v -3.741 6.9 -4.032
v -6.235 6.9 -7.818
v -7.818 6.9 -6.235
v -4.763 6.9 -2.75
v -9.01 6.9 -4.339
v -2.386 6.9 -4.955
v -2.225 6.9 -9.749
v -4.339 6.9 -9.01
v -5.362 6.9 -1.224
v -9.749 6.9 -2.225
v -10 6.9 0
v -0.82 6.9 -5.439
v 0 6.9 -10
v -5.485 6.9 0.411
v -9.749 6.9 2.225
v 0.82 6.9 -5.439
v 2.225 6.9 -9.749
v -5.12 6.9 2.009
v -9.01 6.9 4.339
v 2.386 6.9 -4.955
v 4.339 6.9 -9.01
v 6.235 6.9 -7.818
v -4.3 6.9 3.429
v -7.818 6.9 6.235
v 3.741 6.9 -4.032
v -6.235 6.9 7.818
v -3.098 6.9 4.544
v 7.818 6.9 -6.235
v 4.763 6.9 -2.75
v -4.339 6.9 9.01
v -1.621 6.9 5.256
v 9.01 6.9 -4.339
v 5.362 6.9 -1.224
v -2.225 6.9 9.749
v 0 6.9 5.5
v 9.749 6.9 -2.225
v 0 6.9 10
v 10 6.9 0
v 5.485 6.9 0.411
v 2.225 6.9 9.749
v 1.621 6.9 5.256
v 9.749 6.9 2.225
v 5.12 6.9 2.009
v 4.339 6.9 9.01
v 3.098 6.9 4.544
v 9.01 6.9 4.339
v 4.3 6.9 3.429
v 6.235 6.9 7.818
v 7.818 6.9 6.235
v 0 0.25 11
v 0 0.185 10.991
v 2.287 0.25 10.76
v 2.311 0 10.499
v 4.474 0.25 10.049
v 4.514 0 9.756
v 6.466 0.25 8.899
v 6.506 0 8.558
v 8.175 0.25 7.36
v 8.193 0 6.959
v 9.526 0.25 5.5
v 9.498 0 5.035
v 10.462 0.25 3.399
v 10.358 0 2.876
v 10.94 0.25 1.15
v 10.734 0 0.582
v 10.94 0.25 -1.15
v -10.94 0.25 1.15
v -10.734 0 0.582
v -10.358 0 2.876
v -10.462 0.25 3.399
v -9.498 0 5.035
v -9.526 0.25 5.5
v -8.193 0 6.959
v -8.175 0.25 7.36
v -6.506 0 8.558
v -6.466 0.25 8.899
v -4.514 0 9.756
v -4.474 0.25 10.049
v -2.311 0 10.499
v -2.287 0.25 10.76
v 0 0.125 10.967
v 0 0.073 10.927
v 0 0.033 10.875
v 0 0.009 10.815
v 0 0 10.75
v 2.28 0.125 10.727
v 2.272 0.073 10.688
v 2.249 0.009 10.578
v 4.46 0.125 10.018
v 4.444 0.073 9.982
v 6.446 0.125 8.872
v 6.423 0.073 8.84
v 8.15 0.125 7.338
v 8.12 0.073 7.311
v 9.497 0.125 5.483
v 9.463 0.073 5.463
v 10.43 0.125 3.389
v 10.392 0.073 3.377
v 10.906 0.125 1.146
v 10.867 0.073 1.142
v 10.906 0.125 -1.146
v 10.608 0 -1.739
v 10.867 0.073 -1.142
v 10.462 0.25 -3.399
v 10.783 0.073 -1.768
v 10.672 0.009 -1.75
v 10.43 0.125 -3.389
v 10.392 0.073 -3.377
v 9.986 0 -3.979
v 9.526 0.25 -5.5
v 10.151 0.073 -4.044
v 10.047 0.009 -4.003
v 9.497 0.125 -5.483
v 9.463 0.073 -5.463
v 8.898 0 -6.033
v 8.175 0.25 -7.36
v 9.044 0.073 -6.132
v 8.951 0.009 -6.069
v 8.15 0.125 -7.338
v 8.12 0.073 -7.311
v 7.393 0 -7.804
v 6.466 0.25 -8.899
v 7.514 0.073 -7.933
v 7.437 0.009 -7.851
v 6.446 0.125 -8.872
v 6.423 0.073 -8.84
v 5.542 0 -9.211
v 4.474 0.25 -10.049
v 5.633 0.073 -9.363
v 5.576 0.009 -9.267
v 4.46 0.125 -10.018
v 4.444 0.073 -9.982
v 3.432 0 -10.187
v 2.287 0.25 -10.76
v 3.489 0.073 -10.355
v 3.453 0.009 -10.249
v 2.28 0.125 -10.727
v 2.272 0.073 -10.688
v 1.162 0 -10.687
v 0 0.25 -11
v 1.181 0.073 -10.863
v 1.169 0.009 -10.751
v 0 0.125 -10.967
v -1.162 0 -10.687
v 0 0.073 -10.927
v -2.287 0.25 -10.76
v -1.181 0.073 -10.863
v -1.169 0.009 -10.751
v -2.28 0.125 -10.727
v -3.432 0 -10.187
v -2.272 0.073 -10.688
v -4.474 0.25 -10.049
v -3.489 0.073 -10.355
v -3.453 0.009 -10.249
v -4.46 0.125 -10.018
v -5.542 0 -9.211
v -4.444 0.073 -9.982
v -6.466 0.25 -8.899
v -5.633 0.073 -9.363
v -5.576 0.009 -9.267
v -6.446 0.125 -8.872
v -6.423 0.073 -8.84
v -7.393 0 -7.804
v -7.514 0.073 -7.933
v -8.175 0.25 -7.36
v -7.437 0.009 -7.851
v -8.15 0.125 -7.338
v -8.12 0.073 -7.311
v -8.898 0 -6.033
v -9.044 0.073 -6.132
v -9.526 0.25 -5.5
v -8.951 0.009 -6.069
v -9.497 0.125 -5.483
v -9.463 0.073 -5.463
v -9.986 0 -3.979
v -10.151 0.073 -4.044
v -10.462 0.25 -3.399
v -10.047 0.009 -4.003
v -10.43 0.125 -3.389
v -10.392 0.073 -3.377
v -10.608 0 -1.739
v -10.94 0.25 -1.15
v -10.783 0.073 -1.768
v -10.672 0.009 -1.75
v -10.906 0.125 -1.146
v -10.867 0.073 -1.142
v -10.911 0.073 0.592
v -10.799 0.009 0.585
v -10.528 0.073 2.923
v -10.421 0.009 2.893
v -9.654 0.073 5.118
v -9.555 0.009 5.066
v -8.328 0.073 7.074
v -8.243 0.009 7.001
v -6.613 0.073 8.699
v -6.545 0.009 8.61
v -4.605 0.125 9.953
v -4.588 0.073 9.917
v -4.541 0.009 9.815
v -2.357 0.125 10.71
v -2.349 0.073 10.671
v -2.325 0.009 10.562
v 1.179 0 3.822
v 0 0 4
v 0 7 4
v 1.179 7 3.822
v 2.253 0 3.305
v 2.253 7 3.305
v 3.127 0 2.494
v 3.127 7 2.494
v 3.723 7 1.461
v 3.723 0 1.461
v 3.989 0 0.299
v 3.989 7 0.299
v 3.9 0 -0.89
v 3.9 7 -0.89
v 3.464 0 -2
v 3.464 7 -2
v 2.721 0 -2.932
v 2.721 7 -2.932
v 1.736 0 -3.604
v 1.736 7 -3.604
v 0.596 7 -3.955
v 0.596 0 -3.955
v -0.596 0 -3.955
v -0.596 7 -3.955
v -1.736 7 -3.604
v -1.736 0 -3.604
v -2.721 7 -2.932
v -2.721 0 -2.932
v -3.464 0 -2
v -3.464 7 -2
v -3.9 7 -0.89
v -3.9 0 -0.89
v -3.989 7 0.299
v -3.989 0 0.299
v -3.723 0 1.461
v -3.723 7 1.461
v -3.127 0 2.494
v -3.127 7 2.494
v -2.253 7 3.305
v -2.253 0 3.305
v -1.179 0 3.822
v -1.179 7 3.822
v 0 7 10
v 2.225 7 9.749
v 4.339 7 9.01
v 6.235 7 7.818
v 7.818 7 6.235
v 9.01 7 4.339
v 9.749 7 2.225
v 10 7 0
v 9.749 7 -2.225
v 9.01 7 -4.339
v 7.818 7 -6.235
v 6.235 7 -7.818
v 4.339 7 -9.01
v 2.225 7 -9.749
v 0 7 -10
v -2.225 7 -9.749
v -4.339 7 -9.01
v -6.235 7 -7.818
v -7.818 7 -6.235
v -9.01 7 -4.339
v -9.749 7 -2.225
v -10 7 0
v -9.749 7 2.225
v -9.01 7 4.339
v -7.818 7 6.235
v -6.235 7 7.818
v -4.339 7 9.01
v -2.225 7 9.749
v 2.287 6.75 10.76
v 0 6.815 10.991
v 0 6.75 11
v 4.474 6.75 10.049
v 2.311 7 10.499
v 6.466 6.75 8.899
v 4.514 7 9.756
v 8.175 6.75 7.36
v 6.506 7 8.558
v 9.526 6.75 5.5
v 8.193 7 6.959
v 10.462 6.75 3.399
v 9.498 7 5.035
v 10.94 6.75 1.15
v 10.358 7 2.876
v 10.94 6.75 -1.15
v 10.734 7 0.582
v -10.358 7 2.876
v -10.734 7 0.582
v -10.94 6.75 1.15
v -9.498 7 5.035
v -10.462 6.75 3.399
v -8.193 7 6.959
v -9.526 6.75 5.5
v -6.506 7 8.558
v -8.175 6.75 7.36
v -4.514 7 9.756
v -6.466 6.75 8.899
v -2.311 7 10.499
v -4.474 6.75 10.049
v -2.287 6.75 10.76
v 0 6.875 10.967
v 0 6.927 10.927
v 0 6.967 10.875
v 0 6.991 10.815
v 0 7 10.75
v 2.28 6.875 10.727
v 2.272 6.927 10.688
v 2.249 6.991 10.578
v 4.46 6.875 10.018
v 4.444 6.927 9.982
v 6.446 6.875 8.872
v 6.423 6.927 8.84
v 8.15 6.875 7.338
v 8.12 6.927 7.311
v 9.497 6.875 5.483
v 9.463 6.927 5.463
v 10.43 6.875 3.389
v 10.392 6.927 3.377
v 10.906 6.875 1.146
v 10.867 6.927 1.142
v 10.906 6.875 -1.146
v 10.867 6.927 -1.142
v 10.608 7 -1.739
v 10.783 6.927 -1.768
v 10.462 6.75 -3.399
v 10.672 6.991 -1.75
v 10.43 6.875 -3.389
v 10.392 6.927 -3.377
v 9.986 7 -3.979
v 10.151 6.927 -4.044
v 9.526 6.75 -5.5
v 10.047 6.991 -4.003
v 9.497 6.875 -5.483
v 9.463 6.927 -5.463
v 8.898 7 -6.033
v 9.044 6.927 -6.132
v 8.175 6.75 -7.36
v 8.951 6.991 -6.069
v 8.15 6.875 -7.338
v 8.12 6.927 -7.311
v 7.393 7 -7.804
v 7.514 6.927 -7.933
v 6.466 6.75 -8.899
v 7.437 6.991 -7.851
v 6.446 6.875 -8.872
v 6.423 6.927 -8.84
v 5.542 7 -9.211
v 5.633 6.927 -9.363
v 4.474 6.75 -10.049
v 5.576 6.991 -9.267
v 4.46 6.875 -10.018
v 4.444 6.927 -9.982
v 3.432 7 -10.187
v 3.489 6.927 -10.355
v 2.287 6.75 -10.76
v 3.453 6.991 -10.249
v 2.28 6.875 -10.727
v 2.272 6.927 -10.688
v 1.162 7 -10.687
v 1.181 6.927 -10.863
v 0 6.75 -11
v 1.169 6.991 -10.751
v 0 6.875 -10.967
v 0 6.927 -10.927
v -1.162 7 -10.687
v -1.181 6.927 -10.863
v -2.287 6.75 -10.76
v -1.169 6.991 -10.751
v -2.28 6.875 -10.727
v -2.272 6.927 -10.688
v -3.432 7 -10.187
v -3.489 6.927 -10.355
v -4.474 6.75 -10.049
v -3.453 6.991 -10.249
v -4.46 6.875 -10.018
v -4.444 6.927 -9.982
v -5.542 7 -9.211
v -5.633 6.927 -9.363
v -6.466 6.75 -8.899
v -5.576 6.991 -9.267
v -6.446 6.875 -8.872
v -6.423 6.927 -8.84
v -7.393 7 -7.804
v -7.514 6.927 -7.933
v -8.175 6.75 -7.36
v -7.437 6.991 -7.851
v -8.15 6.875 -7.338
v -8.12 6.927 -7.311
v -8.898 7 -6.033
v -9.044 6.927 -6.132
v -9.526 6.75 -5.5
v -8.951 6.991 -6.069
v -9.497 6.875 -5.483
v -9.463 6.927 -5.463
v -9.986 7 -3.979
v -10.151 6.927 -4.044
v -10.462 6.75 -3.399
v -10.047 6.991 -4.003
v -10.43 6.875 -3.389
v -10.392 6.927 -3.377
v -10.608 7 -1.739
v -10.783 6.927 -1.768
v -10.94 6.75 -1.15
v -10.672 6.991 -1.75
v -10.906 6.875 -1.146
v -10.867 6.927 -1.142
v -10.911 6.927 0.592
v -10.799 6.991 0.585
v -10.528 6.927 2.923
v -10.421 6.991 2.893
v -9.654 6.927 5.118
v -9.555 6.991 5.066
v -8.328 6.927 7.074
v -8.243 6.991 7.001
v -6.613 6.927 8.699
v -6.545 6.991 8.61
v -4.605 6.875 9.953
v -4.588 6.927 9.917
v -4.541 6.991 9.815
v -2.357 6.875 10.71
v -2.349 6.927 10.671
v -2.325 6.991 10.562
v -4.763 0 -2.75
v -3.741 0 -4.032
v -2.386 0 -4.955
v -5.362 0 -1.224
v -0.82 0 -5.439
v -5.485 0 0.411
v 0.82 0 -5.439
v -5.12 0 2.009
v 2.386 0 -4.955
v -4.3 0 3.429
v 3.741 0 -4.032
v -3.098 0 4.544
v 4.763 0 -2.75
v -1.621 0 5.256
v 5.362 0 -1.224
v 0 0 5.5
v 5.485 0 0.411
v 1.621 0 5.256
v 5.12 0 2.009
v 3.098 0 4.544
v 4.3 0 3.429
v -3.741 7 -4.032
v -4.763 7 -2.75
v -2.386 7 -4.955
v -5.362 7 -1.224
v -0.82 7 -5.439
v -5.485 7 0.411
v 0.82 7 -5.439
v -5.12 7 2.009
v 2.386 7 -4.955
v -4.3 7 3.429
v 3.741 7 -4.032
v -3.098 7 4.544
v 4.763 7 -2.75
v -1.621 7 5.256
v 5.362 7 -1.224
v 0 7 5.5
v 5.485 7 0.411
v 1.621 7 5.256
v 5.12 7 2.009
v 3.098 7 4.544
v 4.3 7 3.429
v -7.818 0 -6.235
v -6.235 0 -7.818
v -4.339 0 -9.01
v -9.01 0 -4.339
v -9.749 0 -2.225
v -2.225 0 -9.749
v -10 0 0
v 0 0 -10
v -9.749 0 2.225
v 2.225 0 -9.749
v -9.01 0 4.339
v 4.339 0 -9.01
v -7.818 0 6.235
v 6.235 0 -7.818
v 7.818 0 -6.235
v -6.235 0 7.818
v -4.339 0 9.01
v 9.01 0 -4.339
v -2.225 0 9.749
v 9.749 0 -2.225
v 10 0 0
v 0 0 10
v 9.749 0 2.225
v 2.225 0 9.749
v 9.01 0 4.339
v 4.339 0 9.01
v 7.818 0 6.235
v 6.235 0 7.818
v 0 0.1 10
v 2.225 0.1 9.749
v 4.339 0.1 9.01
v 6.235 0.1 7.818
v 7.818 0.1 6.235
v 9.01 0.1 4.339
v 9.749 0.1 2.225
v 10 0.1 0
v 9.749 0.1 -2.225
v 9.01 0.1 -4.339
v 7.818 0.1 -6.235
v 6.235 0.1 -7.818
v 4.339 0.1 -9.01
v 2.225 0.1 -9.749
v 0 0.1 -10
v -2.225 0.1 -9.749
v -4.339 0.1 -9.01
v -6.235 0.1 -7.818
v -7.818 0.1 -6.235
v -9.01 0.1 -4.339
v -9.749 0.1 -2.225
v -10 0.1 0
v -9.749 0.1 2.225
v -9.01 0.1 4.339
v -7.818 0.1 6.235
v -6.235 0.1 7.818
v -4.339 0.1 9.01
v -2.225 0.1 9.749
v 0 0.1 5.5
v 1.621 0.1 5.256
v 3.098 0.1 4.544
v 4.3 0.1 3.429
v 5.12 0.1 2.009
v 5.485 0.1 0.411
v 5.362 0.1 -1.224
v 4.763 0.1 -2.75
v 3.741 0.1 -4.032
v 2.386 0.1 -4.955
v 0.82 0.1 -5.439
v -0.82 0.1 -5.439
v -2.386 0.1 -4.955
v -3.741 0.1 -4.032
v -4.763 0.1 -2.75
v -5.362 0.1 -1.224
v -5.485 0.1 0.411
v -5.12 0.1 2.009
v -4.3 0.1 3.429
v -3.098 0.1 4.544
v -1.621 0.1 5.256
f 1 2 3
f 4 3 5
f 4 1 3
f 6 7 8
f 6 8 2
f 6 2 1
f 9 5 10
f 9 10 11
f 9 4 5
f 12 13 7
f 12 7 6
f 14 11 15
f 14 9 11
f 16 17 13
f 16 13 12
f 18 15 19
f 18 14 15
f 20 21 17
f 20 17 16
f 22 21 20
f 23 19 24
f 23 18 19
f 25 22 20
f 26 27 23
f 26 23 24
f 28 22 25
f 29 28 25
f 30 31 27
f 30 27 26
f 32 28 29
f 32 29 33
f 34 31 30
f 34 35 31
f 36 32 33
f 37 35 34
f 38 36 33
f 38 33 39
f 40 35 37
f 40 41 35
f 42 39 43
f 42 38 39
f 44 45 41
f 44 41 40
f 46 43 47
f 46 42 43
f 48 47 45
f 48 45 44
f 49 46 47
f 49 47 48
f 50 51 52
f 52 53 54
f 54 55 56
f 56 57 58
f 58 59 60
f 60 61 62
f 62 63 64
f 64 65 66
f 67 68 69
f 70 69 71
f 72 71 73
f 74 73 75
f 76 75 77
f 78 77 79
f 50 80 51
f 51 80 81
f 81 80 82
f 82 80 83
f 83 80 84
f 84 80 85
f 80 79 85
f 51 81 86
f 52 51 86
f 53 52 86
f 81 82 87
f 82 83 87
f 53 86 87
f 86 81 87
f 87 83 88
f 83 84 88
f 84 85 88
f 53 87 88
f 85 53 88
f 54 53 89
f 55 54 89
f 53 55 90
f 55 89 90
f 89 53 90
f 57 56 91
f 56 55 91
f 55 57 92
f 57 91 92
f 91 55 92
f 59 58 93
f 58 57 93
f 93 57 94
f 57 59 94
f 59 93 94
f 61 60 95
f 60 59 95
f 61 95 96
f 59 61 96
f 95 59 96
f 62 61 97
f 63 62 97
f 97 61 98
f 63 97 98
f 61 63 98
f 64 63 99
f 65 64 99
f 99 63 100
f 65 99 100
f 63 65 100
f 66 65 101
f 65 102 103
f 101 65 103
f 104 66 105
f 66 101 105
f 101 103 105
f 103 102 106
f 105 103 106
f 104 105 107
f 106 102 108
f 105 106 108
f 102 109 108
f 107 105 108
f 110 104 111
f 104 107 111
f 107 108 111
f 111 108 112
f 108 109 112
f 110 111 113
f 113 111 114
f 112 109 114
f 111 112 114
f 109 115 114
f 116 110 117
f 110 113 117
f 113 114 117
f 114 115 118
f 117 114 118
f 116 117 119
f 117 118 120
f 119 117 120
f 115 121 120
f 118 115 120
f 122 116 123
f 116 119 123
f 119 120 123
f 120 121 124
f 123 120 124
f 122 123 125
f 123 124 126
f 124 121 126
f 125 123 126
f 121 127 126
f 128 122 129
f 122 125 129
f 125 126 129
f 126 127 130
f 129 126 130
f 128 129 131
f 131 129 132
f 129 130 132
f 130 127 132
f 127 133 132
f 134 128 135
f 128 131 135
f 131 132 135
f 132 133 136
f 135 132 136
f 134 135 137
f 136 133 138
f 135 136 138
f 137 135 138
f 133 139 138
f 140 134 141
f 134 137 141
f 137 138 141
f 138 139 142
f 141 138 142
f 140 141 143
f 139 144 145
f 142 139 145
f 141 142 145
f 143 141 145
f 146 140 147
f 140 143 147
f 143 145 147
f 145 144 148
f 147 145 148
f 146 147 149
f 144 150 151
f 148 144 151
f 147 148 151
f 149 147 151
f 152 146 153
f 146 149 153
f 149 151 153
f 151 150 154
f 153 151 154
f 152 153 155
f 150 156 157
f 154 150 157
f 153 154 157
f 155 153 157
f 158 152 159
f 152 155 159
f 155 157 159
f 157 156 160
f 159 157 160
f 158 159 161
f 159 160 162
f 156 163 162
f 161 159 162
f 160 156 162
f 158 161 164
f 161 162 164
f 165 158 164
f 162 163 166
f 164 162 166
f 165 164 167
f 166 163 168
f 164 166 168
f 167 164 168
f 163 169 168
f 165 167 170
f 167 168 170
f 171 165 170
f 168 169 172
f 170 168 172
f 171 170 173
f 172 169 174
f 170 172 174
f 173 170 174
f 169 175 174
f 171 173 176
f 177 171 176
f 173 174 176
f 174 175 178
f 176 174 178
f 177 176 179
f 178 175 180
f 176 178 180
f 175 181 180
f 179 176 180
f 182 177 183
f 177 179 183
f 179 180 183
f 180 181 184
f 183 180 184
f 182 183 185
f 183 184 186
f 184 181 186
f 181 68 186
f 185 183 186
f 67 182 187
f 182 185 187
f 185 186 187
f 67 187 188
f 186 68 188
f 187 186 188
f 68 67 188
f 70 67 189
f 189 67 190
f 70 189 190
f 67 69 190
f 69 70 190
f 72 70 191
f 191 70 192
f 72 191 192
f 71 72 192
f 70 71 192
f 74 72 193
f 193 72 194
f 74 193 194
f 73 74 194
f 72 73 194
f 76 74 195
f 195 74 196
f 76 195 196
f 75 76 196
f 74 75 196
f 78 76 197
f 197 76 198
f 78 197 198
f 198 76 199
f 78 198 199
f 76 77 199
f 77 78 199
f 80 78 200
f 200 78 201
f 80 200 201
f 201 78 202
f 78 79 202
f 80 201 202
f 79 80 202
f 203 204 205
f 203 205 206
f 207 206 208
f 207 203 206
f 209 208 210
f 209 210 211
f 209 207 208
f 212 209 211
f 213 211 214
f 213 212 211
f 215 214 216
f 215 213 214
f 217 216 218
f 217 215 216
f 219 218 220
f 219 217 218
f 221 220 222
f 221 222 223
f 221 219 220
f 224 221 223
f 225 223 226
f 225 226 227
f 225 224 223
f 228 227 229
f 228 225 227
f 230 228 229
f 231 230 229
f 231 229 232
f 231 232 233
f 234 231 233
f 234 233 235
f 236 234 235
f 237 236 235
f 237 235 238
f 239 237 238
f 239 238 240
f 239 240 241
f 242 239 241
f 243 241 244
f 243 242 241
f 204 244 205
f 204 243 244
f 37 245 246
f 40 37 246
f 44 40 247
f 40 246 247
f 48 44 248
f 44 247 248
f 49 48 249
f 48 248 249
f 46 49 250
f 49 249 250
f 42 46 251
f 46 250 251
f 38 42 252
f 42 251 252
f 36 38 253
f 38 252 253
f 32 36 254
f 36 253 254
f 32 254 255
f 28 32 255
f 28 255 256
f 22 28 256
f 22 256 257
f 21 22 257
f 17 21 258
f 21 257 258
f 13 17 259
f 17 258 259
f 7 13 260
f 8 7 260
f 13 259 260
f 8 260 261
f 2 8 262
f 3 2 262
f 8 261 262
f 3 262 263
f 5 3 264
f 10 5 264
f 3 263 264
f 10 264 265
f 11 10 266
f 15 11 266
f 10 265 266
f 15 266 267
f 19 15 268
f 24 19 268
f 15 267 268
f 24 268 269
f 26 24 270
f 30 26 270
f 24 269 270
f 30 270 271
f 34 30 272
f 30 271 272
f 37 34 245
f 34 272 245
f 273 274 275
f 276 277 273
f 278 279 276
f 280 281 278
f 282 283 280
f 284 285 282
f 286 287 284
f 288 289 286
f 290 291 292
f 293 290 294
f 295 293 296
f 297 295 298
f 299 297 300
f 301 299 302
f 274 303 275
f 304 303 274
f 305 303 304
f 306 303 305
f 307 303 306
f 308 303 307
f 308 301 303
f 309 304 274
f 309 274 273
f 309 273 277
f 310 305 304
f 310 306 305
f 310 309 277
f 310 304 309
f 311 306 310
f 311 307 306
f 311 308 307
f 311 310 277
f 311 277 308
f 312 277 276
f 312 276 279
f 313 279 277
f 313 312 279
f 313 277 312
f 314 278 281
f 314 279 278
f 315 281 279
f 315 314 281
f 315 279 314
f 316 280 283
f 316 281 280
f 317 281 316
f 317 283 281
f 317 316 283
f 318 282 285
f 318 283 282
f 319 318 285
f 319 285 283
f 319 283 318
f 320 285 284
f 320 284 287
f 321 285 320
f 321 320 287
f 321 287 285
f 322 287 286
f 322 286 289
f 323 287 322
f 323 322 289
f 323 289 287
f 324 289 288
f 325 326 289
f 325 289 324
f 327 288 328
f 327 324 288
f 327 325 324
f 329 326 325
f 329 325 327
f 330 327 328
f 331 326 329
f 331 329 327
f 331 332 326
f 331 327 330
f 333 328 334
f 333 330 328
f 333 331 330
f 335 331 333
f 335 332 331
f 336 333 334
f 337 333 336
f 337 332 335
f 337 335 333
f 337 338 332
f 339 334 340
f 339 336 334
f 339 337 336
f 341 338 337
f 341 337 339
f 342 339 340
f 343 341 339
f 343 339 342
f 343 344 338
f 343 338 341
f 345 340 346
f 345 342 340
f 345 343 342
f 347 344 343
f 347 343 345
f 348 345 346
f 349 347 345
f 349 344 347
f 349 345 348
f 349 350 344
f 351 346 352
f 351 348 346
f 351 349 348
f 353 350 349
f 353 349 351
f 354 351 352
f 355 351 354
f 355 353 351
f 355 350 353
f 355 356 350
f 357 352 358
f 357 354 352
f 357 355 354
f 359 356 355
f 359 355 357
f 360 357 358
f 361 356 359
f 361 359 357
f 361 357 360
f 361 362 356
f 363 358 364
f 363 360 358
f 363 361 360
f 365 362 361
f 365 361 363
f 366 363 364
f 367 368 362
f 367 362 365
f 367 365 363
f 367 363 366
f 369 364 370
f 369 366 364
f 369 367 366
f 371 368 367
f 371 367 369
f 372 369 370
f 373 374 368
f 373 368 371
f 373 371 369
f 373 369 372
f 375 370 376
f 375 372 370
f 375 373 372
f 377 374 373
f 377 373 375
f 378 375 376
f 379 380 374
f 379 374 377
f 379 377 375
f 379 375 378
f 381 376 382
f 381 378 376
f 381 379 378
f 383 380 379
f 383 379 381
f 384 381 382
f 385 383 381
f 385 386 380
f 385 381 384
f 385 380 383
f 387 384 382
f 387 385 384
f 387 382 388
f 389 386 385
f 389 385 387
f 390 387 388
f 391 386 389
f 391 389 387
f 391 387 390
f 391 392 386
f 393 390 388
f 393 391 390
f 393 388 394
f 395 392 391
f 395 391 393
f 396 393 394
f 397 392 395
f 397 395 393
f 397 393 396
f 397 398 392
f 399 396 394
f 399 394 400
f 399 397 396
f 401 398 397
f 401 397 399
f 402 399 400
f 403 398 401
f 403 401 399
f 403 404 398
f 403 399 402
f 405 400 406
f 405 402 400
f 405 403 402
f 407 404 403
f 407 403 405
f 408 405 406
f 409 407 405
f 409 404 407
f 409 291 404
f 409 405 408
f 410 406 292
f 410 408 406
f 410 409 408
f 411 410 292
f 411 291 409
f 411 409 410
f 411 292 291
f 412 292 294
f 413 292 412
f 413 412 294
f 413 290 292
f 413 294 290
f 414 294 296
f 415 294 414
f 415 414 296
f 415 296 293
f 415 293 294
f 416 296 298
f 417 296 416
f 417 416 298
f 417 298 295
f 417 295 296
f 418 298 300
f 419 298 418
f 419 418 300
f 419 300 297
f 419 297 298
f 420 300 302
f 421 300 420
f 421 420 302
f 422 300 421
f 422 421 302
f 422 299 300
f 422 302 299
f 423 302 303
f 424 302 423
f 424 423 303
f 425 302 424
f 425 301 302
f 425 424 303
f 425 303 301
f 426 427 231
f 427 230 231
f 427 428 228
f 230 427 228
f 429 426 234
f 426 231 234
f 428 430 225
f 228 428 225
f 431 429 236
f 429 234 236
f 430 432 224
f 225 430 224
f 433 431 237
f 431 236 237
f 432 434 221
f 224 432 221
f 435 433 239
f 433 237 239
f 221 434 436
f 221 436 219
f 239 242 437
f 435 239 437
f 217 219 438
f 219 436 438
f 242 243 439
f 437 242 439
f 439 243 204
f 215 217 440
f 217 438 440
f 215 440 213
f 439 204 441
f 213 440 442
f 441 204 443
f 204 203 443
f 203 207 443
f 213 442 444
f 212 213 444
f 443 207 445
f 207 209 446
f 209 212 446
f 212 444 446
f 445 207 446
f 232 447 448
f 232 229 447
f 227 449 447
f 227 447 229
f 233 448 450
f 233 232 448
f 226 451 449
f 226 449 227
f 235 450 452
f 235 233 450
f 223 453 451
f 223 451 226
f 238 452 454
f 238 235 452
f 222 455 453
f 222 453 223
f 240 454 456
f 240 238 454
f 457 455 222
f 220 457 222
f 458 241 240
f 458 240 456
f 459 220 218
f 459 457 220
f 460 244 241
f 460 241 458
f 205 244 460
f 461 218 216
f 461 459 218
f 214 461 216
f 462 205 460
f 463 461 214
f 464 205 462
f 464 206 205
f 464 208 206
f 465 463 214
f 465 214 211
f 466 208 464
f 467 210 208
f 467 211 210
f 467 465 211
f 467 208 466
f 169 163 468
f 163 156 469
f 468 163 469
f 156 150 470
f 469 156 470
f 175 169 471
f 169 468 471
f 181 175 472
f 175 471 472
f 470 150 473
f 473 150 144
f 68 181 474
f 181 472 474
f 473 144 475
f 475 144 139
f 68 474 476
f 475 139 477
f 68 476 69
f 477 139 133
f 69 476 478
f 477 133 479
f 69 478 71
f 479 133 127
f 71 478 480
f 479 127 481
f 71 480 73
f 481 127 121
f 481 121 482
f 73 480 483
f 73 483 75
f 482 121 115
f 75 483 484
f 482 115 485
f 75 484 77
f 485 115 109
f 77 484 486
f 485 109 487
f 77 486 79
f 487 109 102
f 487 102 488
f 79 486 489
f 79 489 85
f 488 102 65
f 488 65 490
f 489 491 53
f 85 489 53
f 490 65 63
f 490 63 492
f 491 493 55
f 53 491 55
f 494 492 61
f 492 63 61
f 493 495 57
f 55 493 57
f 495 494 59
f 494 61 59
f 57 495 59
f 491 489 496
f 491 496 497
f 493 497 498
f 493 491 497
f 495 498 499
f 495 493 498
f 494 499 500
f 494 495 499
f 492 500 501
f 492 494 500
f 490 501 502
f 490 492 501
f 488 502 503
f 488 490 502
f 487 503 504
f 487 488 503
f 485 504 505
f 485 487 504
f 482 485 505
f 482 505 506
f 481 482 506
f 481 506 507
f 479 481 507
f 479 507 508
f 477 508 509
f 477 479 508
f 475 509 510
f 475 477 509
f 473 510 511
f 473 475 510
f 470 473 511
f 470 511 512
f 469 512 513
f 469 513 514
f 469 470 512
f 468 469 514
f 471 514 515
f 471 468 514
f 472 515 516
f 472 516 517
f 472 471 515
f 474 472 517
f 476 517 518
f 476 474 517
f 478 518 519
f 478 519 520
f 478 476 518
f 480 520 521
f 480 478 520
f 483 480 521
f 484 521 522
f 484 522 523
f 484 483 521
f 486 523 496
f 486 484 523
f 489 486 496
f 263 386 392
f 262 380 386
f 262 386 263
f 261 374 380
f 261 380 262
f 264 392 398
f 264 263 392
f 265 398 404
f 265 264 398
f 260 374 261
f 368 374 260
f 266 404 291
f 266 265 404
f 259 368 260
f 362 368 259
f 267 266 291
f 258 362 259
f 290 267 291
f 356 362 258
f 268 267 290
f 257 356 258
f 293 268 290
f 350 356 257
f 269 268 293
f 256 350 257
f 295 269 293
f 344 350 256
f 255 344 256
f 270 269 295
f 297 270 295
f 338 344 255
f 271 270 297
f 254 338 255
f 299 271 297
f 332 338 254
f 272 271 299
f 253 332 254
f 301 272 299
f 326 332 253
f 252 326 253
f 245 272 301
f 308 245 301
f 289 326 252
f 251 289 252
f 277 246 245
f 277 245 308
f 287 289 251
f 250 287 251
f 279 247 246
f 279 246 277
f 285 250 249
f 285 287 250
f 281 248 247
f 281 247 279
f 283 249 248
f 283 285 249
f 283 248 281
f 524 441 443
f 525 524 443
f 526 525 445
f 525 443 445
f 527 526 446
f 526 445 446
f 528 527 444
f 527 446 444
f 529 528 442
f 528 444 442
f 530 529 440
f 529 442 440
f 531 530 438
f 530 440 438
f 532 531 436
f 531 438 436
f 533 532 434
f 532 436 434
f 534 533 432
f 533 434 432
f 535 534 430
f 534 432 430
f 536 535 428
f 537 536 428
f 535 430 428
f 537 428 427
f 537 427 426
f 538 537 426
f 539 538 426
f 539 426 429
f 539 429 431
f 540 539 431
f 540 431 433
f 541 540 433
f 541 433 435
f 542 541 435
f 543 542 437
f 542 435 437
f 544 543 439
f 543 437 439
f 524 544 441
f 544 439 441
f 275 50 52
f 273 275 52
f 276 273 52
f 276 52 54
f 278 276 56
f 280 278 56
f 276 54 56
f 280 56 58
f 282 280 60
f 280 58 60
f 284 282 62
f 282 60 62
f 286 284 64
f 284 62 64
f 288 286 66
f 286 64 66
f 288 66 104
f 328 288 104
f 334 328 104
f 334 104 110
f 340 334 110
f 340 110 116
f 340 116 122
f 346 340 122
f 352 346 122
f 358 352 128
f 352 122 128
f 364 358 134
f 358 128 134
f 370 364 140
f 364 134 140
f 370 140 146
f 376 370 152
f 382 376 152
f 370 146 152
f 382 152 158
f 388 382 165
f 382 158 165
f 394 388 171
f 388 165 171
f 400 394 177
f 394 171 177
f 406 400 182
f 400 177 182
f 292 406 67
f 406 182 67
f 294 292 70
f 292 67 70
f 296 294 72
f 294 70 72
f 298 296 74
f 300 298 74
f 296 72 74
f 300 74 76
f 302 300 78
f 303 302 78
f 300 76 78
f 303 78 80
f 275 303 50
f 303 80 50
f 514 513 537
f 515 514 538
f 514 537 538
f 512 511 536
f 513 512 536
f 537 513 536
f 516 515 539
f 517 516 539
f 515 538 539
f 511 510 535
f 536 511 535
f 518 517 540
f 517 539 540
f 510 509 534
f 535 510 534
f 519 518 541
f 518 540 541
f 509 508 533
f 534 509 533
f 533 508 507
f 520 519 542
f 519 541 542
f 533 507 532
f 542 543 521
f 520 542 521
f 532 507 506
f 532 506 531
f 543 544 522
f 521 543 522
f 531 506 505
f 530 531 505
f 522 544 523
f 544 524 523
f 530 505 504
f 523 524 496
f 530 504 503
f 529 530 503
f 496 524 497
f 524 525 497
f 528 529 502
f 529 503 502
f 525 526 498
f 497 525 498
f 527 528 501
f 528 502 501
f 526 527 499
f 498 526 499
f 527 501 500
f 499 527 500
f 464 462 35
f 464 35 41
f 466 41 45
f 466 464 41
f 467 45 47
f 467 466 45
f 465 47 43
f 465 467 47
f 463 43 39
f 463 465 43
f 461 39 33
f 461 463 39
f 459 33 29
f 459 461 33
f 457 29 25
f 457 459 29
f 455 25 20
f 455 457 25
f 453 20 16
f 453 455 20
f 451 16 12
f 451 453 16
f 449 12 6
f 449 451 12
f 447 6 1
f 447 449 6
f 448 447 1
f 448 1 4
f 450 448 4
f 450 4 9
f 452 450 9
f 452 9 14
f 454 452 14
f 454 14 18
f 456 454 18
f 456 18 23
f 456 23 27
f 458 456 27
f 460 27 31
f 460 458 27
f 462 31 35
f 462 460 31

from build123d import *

# Parameters (mm, degrees)
SKETCH1_R           = 11
SKETCH1_R_2         = 4
BOSS_EXTRUDE1_DEPTH = 7
SKETCH2_R           = 10
SKETCH2_R_2         = 5.5
CUT_EXTRUDE1_DEPTH  = 0.1
FILLET1_R           = 0.25


with BuildPart() as part:
    # Sketch1 → Boss-Extrude1 (new body)
    with BuildSketch(Plane(origin=(0, 0, 0), x_dir=(1, 0, 0), z_dir=(0, 1, 0))):
        with Locations(Location((0, 0, 0), (0, 0, 270))):
            Circle(SKETCH1_R)
        with Locations(Location((0, 0, 0), (0, 0, 270))):
            Circle(SKETCH1_R_2, mode=Mode.SUBTRACT)
    extrude(amount=BOSS_EXTRUDE1_DEPTH)

    # Sketch2 → Cut-Extrude1 (cut)
    with BuildSketch(Plane(origin=(0, 7, 0), x_dir=(1, 0, 0), z_dir=(0, 1, 0))):
        with Locations(Location((0, 0, 0), (0, 0, 270))):
            Circle(SKETCH2_R)
        with Locations(Location((0, 0, 0), (0, 0, 270))):
            Circle(SKETCH2_R_2, mode=Mode.SUBTRACT)
    cut_extrude1 = extrude(amount=-CUT_EXTRUDE1_DEPTH, mode=Mode.SUBTRACT)

    # Mirror1: Cut-Extrude1 across plane
    add(cut_extrude1.mirror(Plane.ZX.offset(3.5)), mode=Mode.SUBTRACT)

    # Fillet1
    fillet1_edges = [part.edges().sort_by_distance(p)[0] for p in [
        (0, 0, -11),
        (0, 7, -11),
    ]]
    fillet(fillet1_edges, radius=FILLET1_R)


solid = part.part
